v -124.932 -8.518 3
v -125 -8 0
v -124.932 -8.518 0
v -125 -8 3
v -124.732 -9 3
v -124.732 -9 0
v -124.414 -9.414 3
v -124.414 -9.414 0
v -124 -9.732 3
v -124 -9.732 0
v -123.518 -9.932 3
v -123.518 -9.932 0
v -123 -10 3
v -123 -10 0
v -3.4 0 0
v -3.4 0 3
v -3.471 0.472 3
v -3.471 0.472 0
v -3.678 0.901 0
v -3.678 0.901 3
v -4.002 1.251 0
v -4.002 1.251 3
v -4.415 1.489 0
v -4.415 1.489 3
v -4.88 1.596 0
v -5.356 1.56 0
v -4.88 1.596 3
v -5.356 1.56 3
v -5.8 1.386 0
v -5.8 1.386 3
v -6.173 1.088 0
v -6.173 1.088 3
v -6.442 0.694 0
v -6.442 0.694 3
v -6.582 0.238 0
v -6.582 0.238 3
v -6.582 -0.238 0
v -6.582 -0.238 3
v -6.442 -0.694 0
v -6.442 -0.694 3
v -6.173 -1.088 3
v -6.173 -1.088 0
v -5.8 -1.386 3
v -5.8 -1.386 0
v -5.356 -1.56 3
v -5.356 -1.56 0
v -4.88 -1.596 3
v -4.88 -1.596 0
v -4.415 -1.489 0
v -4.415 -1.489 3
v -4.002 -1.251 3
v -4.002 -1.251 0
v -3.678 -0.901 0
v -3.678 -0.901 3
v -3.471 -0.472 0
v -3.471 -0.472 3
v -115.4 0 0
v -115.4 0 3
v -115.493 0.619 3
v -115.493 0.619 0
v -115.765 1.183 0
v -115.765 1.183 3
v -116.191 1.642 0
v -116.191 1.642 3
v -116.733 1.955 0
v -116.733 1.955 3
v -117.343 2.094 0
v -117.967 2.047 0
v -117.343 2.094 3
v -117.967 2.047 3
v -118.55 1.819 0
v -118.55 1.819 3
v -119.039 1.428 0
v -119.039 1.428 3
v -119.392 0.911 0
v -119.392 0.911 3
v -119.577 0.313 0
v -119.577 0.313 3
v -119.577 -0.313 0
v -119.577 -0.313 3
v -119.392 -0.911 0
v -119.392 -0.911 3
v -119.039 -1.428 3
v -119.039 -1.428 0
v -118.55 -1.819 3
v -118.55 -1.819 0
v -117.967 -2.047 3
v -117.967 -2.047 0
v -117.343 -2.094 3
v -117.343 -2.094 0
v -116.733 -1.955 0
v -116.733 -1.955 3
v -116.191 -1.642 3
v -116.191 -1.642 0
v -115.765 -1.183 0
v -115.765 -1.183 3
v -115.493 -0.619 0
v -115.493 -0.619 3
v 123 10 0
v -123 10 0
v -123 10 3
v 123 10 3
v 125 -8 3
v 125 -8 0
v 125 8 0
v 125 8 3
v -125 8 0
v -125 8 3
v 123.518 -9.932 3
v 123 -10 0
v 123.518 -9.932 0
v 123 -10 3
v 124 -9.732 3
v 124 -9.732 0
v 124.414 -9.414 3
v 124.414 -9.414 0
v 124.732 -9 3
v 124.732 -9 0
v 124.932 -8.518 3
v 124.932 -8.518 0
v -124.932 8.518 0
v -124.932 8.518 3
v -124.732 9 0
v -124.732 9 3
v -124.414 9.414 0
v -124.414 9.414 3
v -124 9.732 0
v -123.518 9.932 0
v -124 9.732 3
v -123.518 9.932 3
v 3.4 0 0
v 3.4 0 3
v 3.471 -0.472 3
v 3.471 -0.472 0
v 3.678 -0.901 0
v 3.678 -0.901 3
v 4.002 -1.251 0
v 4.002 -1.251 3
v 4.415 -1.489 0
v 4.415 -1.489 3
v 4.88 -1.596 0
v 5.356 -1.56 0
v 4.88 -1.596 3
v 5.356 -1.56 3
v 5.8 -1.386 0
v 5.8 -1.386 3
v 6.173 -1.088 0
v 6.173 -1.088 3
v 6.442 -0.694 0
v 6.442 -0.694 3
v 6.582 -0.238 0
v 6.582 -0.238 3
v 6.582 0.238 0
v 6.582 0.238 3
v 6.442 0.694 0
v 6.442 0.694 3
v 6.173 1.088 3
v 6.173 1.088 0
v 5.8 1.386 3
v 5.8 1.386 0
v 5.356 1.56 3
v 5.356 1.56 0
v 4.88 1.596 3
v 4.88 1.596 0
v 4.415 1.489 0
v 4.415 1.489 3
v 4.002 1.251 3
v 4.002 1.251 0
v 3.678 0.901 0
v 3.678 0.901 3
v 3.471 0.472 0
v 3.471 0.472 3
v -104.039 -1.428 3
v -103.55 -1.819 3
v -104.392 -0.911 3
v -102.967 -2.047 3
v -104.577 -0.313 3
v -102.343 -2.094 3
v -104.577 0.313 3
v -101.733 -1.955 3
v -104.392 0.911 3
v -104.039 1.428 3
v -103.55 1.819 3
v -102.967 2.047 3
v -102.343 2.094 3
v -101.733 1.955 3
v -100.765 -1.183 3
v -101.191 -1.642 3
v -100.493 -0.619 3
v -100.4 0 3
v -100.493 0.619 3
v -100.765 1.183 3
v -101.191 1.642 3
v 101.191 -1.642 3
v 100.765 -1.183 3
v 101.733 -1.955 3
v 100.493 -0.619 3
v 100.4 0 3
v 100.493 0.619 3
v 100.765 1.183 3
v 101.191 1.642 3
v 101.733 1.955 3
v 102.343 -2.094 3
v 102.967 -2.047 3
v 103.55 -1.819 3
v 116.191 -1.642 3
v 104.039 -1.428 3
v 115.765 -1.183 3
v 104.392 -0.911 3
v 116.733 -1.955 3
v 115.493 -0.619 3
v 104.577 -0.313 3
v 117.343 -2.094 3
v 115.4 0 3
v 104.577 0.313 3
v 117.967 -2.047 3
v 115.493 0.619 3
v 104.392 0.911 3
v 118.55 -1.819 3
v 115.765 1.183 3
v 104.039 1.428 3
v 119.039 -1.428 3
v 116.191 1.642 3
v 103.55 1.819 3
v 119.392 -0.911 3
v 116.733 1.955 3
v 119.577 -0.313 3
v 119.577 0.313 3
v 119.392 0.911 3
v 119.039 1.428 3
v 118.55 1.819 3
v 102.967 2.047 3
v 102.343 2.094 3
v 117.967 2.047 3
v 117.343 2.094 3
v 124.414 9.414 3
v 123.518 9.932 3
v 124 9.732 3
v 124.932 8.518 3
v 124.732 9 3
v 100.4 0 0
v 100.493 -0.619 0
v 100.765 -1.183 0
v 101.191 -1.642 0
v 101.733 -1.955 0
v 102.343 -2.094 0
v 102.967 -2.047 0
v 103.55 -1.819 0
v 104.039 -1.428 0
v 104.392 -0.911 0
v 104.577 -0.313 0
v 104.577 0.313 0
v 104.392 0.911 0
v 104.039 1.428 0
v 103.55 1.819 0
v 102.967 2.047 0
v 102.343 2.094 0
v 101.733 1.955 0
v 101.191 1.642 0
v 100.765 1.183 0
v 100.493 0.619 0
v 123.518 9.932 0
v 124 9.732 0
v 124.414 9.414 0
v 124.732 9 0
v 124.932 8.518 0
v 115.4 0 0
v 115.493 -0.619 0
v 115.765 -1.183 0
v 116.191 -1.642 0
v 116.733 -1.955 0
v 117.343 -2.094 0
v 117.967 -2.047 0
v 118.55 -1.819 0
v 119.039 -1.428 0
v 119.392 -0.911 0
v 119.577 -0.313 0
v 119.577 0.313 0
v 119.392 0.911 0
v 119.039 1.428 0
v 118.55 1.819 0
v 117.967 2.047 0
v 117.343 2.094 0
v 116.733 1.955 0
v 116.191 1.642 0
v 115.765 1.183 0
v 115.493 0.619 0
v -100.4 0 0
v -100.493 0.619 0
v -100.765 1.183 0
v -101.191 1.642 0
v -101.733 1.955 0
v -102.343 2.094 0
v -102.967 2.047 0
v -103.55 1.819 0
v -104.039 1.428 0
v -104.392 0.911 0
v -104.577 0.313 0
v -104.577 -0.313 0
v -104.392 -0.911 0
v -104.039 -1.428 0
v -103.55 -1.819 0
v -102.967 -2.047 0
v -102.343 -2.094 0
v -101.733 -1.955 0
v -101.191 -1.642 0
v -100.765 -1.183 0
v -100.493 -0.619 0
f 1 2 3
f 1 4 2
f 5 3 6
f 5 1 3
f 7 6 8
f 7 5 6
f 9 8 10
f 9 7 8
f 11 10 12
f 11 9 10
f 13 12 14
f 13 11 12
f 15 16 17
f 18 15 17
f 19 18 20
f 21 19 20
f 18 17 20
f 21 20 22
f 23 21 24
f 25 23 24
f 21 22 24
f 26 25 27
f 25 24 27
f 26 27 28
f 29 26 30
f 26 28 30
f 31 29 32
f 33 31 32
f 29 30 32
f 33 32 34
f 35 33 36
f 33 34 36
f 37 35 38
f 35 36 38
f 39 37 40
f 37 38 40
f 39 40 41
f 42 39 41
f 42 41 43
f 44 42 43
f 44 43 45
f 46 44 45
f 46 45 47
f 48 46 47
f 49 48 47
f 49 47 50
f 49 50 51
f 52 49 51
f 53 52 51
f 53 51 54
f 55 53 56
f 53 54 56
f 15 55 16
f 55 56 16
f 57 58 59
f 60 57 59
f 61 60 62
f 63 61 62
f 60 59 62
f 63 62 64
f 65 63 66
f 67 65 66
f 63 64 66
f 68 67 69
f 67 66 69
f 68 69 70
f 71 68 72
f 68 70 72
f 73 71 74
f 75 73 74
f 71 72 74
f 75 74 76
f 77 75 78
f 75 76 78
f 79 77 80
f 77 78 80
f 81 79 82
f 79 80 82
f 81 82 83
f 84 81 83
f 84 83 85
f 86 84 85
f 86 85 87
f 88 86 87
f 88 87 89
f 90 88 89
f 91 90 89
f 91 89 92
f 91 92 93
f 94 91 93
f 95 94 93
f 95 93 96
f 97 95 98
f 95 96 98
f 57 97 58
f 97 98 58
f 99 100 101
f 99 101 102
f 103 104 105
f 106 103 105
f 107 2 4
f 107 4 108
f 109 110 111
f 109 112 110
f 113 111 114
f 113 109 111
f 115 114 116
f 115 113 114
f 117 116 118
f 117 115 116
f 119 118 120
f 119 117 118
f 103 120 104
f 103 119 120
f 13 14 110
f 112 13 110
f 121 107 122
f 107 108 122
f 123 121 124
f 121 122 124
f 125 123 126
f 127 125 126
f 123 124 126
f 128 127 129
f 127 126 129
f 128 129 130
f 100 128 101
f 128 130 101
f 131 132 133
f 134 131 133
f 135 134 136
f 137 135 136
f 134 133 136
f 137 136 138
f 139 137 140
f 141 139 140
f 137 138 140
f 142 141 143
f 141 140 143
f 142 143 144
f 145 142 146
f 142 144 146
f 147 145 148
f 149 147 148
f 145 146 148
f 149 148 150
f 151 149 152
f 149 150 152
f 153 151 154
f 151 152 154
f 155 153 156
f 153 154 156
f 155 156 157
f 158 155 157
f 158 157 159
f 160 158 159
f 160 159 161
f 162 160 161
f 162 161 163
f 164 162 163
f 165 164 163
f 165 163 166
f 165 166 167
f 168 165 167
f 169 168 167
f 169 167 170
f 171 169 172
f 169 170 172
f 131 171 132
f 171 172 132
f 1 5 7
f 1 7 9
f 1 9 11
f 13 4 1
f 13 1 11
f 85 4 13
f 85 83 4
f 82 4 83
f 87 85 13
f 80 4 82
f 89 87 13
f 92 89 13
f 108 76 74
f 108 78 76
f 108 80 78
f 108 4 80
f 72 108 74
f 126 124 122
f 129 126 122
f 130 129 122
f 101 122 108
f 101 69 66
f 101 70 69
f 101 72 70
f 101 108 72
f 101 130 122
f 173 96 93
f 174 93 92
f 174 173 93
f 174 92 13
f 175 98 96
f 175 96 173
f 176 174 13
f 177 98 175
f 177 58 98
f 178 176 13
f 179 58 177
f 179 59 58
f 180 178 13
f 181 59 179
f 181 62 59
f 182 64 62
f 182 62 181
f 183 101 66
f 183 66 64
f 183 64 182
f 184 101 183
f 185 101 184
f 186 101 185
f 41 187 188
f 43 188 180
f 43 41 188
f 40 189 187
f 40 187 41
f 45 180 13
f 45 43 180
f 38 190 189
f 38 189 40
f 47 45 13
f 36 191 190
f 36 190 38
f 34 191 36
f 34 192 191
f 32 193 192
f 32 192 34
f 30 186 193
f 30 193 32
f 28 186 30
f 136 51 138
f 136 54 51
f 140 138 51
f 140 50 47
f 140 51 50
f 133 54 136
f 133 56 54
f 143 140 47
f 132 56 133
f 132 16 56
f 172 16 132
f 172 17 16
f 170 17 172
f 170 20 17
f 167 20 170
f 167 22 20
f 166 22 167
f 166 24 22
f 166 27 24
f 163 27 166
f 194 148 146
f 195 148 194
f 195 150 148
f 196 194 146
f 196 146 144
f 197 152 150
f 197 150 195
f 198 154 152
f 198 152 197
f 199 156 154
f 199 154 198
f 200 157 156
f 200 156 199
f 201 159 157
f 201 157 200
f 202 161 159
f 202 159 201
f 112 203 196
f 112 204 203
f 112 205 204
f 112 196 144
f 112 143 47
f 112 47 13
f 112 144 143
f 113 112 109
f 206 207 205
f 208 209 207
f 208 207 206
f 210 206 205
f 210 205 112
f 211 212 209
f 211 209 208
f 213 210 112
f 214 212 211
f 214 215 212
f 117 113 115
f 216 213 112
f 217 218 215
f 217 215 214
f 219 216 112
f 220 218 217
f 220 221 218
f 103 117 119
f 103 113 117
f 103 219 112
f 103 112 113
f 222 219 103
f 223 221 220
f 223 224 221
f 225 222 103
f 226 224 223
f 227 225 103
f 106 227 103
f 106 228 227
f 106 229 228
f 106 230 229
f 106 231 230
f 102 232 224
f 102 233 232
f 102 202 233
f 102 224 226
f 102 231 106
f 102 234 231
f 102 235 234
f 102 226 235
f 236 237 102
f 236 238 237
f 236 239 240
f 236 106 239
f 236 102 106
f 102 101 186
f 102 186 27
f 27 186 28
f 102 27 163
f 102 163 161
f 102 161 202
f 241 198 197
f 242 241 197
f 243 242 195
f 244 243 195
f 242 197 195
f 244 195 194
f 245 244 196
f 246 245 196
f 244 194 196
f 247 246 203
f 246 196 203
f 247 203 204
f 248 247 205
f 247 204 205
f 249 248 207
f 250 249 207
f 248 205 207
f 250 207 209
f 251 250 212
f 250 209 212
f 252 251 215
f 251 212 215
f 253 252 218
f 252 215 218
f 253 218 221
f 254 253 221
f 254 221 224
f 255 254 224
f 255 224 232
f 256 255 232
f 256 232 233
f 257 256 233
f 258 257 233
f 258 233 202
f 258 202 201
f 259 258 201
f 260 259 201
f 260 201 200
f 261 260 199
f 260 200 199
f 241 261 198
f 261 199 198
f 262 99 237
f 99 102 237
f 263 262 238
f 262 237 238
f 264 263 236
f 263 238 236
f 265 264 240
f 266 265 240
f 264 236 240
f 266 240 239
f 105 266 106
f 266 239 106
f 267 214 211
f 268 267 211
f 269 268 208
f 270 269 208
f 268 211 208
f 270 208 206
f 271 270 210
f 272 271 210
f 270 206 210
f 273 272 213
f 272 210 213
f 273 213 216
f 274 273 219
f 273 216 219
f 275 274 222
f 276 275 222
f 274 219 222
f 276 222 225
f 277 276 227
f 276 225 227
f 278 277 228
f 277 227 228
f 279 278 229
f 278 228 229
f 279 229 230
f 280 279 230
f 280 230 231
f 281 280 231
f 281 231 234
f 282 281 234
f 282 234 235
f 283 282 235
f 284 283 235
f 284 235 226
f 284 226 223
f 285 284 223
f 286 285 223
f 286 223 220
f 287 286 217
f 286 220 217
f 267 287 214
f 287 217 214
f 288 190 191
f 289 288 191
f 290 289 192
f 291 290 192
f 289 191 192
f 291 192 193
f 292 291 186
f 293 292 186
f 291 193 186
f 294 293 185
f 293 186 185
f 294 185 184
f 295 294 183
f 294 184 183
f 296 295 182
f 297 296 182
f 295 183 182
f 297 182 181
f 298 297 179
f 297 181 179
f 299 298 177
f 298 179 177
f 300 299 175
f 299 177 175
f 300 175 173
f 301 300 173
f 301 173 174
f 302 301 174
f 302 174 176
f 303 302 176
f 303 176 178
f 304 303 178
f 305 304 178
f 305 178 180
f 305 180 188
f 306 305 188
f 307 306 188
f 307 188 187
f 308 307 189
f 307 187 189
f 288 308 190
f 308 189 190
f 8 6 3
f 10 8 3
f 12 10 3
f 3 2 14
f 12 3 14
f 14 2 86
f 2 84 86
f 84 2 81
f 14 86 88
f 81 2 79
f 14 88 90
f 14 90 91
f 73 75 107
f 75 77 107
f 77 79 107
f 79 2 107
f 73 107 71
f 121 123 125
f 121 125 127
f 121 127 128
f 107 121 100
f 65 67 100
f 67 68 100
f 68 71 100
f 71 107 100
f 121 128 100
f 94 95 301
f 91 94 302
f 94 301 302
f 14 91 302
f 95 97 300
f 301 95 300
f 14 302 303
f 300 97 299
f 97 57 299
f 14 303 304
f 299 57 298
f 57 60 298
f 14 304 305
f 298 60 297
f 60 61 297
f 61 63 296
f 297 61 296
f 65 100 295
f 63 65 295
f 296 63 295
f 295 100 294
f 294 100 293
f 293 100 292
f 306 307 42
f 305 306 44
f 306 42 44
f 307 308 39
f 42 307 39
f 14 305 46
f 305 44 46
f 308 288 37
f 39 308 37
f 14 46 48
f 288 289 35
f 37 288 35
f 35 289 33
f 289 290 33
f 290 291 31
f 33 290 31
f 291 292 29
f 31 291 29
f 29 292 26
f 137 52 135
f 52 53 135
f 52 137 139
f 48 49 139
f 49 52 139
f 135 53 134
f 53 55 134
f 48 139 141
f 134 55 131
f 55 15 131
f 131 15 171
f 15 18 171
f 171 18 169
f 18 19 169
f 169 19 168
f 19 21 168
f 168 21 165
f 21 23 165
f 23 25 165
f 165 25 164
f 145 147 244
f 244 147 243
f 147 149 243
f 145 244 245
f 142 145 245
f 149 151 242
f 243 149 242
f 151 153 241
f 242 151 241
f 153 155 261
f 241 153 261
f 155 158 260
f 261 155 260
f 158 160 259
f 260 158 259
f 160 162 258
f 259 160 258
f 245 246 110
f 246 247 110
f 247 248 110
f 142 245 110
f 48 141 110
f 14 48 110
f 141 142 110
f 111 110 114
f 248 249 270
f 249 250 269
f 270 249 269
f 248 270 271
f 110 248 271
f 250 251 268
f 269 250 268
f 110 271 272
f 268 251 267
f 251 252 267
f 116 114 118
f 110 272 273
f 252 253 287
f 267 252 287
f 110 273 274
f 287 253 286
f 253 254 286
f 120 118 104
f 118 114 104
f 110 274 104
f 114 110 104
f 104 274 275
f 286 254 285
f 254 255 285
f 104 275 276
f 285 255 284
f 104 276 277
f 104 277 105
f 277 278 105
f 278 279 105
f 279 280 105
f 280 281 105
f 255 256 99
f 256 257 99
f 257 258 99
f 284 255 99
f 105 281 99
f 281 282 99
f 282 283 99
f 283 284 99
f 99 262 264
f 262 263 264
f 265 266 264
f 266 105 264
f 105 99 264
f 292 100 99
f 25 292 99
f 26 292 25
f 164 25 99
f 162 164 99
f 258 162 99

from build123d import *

# Parameters (mm, degrees)
SKETCH_1_W          = 250
SKETCH_1_H          = 20
EXTRUDE_1_DEPTH     = 3
SKETCH_2_R          = 2.1
SKETCH_2_R_2        = 1.6
CUT_EXTRUDE_1_DEPTH = 3
FILLET_1_R          = 2


with BuildPart() as part:
    # 草图1 → 凸台-拉伸1 (new body)
    with BuildSketch(Plane.XY):
        Rectangle(SKETCH_1_W, SKETCH_1_H)
    extrude(amount=EXTRUDE_1_DEPTH)

    # 草图2 → 切除-拉伸1 (cut)
    with BuildSketch(Plane.XY.offset(3)):
        with Locations((-117.5, 0)):
            Circle(SKETCH_2_R)
        with Locations((-102.5, 0)):
            Circle(SKETCH_2_R)
        with Locations(Location((102.5, 0, 0), (0, 0, 180))):
            Circle(SKETCH_2_R)
        with Locations(Location((117.5, 0, 0), (0, 0, 180))):
            Circle(SKETCH_2_R)
        with Locations((-5, 0)):
            Circle(SKETCH_2_R_2)
        with Locations(Location((5, 0, 0), (0, 0, 180))):
            Circle(SKETCH_2_R_2)
    extrude(amount=-CUT_EXTRUDE_1_DEPTH, mode=Mode.SUBTRACT)

    # 圆角1
    fillet_1_edges = [part.edges().sort_by_distance(p)[0] for p in [
        (125, -10, 1.5),
        (-125, -10, 1.5),
        (-125, 10, 1.5),
        (125, 10, 1.5),
    ]]
    fillet(fillet_1_edges, radius=FILLET_1_R)


solid = part.part
